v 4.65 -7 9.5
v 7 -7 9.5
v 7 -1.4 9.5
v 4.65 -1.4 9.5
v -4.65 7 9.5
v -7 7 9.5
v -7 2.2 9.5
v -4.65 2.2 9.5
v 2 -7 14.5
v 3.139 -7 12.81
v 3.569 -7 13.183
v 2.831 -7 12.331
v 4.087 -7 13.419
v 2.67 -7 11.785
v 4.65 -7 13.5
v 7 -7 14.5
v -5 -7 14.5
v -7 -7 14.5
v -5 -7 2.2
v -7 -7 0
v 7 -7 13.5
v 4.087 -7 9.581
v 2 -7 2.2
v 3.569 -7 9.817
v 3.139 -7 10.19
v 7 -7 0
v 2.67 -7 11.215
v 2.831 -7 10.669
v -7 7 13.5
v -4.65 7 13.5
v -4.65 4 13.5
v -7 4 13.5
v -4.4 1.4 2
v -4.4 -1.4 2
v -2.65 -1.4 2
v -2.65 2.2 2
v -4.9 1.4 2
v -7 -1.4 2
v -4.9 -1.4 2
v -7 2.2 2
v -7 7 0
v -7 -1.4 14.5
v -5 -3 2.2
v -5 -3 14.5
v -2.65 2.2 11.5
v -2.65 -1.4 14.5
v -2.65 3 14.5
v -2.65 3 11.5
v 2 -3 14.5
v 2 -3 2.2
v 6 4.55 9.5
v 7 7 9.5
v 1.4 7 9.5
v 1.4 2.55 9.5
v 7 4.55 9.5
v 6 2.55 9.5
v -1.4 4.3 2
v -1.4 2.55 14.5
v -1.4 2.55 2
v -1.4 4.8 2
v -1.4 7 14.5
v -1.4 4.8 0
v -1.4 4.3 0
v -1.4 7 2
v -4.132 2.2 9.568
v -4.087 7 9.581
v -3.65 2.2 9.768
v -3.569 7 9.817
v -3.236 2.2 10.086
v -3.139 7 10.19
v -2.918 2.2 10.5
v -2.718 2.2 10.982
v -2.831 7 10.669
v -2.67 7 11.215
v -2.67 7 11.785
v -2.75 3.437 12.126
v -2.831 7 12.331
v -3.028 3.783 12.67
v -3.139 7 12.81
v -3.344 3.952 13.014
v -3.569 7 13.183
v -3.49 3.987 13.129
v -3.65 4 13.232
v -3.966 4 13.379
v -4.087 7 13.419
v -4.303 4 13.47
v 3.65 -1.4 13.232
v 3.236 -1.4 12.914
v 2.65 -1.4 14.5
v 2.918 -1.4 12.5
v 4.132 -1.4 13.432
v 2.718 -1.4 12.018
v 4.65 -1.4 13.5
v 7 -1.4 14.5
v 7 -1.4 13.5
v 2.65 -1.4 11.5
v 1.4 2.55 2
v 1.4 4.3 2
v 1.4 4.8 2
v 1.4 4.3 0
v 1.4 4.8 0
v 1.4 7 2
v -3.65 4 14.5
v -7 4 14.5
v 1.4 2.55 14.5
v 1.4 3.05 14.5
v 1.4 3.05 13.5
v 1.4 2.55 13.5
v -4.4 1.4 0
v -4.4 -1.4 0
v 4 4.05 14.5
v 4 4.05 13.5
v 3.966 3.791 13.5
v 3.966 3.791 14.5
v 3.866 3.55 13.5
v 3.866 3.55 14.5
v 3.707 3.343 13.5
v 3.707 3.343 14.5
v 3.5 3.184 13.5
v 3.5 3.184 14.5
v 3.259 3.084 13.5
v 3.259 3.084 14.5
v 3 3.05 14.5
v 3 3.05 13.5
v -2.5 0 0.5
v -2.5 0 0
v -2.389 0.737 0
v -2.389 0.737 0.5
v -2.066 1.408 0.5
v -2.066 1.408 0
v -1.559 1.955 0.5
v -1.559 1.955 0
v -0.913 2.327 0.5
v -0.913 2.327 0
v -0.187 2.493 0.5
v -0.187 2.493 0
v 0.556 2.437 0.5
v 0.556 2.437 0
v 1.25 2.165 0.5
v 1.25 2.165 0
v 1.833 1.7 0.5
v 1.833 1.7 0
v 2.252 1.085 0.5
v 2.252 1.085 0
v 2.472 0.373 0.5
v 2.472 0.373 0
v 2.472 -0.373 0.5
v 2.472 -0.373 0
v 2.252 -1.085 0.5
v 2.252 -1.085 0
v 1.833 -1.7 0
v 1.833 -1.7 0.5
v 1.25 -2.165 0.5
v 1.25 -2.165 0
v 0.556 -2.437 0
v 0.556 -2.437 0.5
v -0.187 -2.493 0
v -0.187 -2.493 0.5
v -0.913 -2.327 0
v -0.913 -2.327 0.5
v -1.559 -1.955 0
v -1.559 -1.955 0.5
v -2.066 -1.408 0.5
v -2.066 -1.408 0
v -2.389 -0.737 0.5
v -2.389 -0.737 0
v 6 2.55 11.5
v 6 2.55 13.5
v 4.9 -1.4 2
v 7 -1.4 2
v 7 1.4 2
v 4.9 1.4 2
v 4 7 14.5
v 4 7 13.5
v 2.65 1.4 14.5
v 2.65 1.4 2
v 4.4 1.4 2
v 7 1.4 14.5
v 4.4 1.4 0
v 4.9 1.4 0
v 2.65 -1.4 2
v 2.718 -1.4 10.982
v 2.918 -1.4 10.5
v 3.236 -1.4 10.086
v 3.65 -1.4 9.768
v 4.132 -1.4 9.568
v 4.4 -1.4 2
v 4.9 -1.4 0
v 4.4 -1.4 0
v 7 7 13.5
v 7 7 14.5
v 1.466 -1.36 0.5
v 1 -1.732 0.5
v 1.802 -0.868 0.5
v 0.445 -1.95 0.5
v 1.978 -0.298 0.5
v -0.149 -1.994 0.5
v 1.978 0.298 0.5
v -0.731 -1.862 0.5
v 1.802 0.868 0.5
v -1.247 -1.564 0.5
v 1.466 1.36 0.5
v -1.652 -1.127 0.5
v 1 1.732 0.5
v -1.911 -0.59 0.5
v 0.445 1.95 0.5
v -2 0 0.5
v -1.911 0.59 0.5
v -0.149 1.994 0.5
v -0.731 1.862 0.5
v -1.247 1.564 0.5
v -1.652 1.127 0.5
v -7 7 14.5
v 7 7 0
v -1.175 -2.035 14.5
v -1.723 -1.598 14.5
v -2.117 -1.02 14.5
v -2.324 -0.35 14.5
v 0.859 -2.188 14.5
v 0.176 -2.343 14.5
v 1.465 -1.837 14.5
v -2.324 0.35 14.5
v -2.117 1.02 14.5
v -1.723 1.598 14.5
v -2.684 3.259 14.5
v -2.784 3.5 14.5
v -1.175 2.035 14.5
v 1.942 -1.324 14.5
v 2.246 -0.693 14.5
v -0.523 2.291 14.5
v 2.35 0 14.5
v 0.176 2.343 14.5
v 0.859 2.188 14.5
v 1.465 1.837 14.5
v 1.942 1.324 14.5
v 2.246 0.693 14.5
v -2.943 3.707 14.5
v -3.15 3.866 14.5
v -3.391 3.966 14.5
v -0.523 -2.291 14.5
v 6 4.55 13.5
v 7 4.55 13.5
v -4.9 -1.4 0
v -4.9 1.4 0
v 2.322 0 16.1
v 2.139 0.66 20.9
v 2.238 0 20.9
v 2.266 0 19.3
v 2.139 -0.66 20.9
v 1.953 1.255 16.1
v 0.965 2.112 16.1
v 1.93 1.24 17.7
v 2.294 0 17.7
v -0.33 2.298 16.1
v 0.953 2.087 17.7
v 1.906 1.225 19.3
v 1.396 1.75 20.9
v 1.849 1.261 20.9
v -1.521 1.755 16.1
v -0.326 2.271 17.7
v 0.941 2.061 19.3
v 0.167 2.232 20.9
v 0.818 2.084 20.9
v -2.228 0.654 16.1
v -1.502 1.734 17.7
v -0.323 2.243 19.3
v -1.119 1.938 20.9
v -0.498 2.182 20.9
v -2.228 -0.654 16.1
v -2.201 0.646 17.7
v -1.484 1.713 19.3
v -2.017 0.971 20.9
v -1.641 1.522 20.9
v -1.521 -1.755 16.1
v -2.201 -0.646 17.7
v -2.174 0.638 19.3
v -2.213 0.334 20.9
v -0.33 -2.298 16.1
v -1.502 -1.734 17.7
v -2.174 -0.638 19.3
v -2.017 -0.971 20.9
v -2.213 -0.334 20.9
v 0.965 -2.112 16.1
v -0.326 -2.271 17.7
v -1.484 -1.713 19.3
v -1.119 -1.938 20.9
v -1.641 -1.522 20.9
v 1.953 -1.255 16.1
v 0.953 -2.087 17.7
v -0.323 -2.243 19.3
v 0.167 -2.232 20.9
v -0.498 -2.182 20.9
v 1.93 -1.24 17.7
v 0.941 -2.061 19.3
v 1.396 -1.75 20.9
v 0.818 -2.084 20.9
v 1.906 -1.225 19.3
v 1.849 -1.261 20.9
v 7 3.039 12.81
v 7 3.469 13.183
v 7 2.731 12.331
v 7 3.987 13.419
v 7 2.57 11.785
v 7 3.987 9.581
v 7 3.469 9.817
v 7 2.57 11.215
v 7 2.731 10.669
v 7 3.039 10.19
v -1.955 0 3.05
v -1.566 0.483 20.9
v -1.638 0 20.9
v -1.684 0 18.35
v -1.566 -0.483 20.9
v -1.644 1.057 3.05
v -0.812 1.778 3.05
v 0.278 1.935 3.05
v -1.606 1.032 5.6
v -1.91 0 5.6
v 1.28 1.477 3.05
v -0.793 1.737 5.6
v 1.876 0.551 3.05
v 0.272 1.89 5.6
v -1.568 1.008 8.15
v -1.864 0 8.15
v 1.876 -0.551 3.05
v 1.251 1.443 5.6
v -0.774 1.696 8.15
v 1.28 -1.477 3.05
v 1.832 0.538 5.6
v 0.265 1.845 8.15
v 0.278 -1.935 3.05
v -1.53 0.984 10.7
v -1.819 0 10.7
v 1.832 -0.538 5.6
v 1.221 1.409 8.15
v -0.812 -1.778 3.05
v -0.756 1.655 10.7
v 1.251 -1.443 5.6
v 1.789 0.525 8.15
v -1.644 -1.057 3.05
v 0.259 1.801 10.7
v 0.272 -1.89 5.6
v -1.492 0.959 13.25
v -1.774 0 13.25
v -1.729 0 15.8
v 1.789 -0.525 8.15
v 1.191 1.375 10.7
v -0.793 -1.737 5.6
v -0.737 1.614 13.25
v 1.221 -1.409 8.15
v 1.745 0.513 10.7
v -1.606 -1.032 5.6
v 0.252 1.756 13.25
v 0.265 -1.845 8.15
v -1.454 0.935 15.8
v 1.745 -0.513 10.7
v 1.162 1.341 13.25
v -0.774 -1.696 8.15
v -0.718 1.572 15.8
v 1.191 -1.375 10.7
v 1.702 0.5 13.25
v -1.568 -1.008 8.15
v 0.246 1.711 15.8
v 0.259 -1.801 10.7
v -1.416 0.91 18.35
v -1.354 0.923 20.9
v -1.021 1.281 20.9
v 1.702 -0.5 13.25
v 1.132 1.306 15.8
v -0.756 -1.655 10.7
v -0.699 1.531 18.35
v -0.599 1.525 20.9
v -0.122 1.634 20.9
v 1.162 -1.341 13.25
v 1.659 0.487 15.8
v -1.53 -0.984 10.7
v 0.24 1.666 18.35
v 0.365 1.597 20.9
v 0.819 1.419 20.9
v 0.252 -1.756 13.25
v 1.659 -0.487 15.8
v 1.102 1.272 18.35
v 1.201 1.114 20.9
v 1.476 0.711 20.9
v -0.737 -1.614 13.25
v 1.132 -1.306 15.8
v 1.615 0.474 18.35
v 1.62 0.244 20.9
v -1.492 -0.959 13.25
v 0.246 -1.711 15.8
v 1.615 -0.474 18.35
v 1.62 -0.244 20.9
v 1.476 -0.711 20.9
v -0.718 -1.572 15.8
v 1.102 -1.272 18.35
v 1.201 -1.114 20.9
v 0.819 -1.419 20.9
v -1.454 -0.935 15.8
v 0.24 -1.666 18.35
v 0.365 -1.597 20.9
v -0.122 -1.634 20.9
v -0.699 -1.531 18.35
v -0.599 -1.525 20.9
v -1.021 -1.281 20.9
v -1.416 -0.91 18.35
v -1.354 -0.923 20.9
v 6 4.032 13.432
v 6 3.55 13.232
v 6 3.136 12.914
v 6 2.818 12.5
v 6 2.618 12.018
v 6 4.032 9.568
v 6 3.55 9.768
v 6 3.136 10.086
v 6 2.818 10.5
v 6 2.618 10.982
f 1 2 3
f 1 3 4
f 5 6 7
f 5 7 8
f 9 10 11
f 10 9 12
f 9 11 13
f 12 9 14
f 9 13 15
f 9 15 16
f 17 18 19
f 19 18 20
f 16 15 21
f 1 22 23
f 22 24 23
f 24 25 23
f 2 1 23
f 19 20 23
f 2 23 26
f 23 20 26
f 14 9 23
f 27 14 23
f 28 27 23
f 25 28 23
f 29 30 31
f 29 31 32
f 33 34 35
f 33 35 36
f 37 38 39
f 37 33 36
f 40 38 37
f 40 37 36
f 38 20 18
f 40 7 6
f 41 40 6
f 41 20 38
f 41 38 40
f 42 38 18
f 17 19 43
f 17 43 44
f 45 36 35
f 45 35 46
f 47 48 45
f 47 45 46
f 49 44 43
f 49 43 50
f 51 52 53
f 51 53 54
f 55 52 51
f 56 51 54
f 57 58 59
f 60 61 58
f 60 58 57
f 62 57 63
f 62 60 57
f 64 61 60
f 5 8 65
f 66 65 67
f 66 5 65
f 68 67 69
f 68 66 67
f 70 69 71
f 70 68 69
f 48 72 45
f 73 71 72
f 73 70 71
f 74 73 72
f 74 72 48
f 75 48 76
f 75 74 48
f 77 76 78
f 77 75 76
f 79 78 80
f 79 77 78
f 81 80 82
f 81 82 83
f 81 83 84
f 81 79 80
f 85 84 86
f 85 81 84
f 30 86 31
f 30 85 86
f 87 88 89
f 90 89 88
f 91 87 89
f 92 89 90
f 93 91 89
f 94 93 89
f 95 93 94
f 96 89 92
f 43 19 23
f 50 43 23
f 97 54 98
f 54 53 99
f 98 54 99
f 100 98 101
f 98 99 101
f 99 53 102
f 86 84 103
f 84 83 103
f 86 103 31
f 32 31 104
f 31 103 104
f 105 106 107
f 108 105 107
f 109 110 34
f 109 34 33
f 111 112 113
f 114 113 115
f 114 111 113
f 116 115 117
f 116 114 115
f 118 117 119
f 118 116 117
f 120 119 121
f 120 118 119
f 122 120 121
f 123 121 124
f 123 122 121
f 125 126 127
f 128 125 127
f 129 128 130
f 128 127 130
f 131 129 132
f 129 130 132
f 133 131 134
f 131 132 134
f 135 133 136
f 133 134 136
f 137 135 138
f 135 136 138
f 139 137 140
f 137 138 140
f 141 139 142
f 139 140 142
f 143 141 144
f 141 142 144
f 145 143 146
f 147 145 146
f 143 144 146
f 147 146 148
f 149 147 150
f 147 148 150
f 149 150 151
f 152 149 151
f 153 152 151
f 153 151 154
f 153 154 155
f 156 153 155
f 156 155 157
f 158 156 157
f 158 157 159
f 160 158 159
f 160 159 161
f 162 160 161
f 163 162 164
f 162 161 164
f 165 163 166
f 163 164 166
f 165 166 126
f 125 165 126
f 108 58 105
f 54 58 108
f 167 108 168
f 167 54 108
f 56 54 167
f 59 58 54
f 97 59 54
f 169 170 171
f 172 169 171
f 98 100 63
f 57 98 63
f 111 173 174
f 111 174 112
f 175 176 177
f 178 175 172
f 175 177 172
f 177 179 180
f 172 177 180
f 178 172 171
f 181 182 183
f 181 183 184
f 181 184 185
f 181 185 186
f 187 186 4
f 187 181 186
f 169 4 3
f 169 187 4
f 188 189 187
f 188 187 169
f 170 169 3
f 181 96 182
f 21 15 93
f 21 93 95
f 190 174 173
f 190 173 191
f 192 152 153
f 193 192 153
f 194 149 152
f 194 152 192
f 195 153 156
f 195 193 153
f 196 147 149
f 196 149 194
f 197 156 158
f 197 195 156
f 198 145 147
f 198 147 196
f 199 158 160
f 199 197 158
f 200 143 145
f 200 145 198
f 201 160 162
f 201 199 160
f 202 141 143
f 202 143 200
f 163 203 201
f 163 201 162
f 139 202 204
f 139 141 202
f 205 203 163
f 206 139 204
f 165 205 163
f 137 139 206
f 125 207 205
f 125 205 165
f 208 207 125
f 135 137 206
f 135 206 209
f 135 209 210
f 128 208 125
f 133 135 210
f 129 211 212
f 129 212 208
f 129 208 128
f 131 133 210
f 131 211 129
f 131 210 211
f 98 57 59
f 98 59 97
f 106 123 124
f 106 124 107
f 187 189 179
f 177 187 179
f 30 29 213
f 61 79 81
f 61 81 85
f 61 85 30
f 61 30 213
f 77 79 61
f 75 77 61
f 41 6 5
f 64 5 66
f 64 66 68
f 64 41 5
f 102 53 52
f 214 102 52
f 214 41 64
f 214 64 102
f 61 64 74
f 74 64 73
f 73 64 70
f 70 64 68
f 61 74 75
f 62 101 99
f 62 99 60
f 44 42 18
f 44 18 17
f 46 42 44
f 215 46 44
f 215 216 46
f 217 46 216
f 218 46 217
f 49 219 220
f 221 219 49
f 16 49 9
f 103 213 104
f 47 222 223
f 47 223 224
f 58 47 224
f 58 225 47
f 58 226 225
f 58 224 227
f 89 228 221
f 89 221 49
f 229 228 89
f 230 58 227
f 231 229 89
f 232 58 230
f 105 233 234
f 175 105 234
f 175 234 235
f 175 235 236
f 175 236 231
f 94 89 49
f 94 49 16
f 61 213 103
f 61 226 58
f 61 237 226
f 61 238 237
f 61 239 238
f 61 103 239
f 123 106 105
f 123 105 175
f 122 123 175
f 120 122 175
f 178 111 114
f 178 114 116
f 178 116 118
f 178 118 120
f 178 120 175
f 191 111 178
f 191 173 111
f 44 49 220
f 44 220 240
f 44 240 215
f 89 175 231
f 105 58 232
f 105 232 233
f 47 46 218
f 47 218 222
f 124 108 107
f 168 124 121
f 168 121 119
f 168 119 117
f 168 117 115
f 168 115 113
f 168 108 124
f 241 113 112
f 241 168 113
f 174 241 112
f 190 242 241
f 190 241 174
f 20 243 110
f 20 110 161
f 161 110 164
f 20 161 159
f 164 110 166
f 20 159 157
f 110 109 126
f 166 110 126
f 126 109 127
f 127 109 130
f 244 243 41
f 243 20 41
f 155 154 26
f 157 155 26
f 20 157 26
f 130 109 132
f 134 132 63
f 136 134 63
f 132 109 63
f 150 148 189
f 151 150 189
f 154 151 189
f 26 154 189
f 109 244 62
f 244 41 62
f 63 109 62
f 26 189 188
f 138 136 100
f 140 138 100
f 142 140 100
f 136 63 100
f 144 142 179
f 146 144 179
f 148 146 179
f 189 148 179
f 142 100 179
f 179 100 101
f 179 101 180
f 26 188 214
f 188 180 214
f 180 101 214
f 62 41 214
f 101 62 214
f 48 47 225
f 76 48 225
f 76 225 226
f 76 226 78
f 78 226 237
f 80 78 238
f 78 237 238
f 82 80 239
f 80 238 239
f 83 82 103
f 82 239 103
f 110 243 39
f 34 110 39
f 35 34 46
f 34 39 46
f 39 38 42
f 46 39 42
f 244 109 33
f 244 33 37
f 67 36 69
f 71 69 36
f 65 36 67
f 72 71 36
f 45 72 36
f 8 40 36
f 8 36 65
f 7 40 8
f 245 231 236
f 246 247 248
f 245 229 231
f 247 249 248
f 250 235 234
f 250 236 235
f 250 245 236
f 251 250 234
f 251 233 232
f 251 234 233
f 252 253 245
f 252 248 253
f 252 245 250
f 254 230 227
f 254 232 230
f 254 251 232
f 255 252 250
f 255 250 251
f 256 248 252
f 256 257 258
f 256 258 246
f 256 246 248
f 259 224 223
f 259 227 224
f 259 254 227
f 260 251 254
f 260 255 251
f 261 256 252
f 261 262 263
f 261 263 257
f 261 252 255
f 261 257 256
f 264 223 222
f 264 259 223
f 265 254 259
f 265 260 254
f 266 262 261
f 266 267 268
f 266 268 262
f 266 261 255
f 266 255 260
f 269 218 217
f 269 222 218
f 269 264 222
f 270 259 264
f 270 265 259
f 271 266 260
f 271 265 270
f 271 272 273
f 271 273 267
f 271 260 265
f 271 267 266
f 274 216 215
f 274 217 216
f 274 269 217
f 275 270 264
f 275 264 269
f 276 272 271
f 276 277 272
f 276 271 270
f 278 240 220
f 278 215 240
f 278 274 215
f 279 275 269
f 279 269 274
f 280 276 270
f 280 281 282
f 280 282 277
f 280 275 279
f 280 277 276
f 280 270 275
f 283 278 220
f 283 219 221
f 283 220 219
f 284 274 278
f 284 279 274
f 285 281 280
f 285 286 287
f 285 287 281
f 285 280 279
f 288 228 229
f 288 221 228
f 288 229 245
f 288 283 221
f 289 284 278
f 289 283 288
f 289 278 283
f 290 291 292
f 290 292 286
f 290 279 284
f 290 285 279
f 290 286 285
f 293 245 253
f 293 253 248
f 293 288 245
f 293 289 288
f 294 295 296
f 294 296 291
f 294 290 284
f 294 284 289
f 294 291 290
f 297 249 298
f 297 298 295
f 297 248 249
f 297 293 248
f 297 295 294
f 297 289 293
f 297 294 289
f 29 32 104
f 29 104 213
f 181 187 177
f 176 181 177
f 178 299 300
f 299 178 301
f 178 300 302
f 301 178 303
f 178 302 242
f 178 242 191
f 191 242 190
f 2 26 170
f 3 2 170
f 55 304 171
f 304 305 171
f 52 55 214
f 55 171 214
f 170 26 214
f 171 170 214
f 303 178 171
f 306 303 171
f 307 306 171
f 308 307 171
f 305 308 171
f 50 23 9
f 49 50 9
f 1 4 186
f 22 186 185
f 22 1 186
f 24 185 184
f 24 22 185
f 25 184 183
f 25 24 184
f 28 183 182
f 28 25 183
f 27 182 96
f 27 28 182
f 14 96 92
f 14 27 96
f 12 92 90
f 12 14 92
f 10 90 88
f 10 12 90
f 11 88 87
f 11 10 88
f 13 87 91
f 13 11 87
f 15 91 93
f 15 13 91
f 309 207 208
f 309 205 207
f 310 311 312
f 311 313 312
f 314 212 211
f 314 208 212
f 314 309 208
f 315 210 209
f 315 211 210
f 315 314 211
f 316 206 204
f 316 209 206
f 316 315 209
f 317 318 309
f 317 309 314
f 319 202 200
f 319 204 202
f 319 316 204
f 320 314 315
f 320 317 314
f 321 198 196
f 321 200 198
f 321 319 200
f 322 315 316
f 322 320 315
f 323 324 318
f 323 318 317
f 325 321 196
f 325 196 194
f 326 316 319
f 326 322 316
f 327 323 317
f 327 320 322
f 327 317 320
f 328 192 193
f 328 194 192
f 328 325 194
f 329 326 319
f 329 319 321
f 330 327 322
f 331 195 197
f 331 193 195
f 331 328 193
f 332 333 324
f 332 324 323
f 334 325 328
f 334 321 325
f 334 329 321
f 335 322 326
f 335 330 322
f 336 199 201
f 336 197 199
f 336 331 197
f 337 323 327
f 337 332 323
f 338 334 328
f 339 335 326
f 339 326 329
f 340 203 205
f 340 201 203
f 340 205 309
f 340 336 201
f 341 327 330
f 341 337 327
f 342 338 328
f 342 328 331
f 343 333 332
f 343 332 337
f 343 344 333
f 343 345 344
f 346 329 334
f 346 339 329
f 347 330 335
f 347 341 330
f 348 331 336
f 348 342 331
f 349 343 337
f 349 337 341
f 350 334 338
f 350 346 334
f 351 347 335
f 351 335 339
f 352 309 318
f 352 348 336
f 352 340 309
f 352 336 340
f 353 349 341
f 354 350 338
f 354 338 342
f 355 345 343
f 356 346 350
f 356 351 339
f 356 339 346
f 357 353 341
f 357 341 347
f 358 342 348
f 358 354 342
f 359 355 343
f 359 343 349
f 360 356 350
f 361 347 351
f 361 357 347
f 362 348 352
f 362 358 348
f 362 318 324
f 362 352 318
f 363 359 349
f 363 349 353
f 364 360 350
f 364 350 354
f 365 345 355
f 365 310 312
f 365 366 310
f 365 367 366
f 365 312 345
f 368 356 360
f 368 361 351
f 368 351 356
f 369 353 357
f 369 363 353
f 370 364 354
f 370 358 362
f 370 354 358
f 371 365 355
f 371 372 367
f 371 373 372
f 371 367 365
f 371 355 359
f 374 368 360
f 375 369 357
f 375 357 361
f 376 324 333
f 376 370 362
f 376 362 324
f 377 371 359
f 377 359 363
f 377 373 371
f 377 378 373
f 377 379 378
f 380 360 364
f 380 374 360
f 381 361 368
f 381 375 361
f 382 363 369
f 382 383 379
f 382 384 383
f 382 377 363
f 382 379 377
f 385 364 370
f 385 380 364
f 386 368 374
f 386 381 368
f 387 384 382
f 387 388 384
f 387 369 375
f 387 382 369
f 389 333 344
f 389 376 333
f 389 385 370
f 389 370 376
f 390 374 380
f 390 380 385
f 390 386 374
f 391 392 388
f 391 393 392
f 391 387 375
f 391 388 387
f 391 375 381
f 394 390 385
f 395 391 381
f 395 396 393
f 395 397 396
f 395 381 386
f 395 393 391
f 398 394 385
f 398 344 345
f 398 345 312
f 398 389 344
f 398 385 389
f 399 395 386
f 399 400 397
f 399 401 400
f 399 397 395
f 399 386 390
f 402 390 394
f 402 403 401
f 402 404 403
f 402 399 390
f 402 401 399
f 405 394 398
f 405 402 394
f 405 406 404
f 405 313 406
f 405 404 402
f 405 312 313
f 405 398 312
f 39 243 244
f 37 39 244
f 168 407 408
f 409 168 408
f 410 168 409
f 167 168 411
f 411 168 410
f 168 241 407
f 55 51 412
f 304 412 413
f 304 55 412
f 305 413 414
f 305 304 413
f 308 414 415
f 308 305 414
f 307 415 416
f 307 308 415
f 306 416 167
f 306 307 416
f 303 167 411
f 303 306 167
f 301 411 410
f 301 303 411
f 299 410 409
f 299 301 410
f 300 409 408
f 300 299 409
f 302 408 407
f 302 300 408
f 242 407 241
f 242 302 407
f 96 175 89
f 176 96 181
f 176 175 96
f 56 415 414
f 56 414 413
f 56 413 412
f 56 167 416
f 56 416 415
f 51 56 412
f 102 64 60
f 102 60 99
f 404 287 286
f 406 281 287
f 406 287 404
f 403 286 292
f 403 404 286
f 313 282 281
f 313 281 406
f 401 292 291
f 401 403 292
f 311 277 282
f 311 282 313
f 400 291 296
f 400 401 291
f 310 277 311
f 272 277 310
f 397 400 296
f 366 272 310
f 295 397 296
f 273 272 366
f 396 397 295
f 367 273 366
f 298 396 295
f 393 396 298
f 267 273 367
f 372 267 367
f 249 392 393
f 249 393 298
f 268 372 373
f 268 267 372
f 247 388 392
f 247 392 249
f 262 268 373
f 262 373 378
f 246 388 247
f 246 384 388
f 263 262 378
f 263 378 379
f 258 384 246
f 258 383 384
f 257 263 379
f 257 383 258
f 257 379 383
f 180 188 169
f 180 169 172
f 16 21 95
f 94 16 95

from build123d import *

# Parameters (mm, degrees)
BASES_W                            = 14
BASES_H                            = 14
BASE_DEPTH                         = 14.5
NEUTRALS_W                         = 0.5
NEUTRALS_H                         = 2.8
NEUTRAL_DEPTH                      = 18.557049866
GROUNDS_W                          = 2.8
GROUNDS_H                          = 0.5
GROUND_DEPTH                       = 18.557049866
TOP_GROUND_AREA_REACH              = 23.337
SKETCH1_W                          = 2.8
SKETCH1_H                          = 11.5
SKETCH15_W                         = 2.8
SKETCH15_H                         = 12.5
GND_POCKET_EXTRA_CUT_DEPTH         = 1.75
SIDE_GROUND_AREA_DEPTH             = 5
SIDE_GND_TERMINAL_SCREW_AREA_REACH = 23.337
POCKET_START                       = -1.75
SKETCH4_W                          = 7.4
SKETCH4_H                          = 4
POCKET_GND_TERMINAL_AREA_DEPTH     = 2
SKETCH6_W                          = 12.5
SKETCH6_H                          = 3.6
NEUTRAL_SIDE_AREA_CUT_DEPTH        = 4.35
NEUTRAL_SIDE_SCREW_TERMINAL_DEPTH  = 8.4
NEUTRAL_SIDE_CURVED_WALL_CUT_REACH = 19.557
SKETCH8_W                          = 12.5
SKETCH8_H                          = 2.8
LINE_AREA_CUT_DEPTH                = 4.35
LINE_SIDE_SCREW_TERMINAL_REACH     = 23.337
SKETCH10_W                         = 7
SKETCH10_H                         = 12.3
BOTTOM_POCKET_DEPTH                = 4
SKETCH11_R                         = 2.5
FASTENER_TOP_BORE_DEPTH            = 0.5
SKETCH13_R                         = 2.35
FASTENER_BOSS_DEPTH                = 6.4
FASTENER_BOSS_TAPER                = 1
SKETCH12_R                         = 2
SKETCH14_R                         = 1.638287584


with BuildPart() as part:
    # BaseS → BASE (new body)
    with BuildSketch(Plane.XY):
        Rectangle(BASES_W, BASES_H)
    extrude(amount=BASE_DEPTH)

    # NeutralS → NEUTRAL (cut, through all)
    with BuildSketch(Plane(origin=(0, 0, 0), x_dir=(-1, 0, 0), z_dir=(0, 0, -1))):
        with Locations((4.65, 0)):
            Rectangle(NEUTRALS_W, NEUTRALS_H)
    neutral = extrude(amount=-NEUTRAL_DEPTH, mode=Mode.SUBTRACT)

    # LINE HM: NEUTRAL across plane
    add(neutral.mirror(Plane(origin=(0, 0, 0), x_dir=(0, 0, 1), z_dir=(1, 0, 0))), mode=Mode.SUBTRACT)

    # GroundS → GROUND (cut, through all)
    with BuildSketch(Plane(origin=(0, 0, 0), x_dir=(-1, 0, 0), z_dir=(0, 0, -1))):
        with Locations((0, 4.55)):
            Rectangle(GROUNDS_W, GROUNDS_H)
    extrude(amount=-GROUND_DEPTH, mode=Mode.SUBTRACT)

    # Sketch1 → TOP GROUND AREA (cut, up to next)
    with BuildSketch(Plane(origin=(0, 7, 0), x_dir=(1, 0, 0), z_dir=(0, 1, 0)), mode=Mode.PRIVATE) as top_ground_area_sk1:
        with Locations((0, -7.75)):
            Rectangle(SKETCH1_W, SKETCH1_H)
    top_ground_area_tool1 = extrude(top_ground_area_sk1.sketch, amount=-TOP_GROUND_AREA_REACH, mode=Mode.PRIVATE) & part.part
    add(top_ground_area_tool1.solids().sort_by_distance((0, 7, 7.75))[0], mode=Mode.SUBTRACT)

    # Sketch15 → GND POCKET EXTRA CUT (cut)
    with BuildSketch(Plane(origin=(0, 4.3, 0), x_dir=(1, 0, 0), z_dir=(0, 1, 0))):
        with Locations((0, -8.25)):
            Rectangle(SKETCH15_W, SKETCH15_H)
    extrude(amount=-GND_POCKET_EXTRA_CUT_DEPTH, mode=Mode.SUBTRACT)

    # Sketch2 → SIDE GROUND AREA (cut)
    with BuildSketch(Plane.XY.offset(14.5)):
        with BuildLine():
            Line((4, 7), (4, 4.05))
            ThreePointArc((4, 4.05), (3.707106781, 3.342893219), (3, 3.05))
            Line((3, 3.05), (0.6, 3.05))
            Line((0.6, 3.05), (0.6, 2.55))
            Line((0.6, 2.55), (-1.4, 2.55))
            Line((-1.4, 2.55), (-1.4, 7))
            Line((-1.4, 7), (4, 7))
        make_face()
    extrude(amount=-SIDE_GROUND_AREA_DEPTH, mode=Mode.SUBTRACT)

    # SIDE GND TERMINAL SCREW AREA: up to this face of the body (flat: up to its plane)
    side_gnd_terminal_screw_area_end = Plane(part.part.faces().sort_by_distance((1.4, 4.635, 6.044915254))[0])
    # Sketch3 → SIDE GND TERMINAL SCREW AREA (cut, up to the picked face)
    with BuildSketch(Plane(origin=(7, 0, 0), x_dir=(0, 0, -1), z_dir=(1, 0, 0)), mode=Mode.PRIVATE) as side_gnd_terminal_screw_area_sk1:
        with BuildLine():
            Line((-9.5, 9.45), (-9.5, 4.55))
            ThreePointArc((-9.5, 4.55), (-11.5, 2.55), (-13.5, 4.55))
            Line((-13.5, 4.55), (-13.5, 9.45))
            ThreePointArc((-13.5, 9.45), (-11.5, 11.45), (-9.5, 9.45))
        make_face()
    side_gnd_terminal_screw_area_tool1 = split(extrude(side_gnd_terminal_screw_area_sk1.sketch, amount=-SIDE_GND_TERMINAL_SCREW_AREA_REACH, mode=Mode.PRIVATE), bisect_by=side_gnd_terminal_screw_area_end, keep=Keep.BOTH, mode=Mode.PRIVATE)
    add(side_gnd_terminal_screw_area_tool1.solids().sort_by(Axis((7, 7, 11.5), (-1, 0, 0)))[0], mode=Mode.SUBTRACT)

    # Sketch4 → POCKET GND TERMINAL AREA (cut)
    with BuildSketch(Plane(origin=(0, 4.3, 0), x_dir=(1, 0, 0), z_dir=(0, 1, 0)).offset(POCKET_START)):
        with Locations((2.3, -11.5)):
            Rectangle(SKETCH4_W, SKETCH4_H)
    extrude(amount=POCKET_GND_TERMINAL_AREA_DEPTH, mode=Mode.SUBTRACT)

    # Sketch6 → NEUTRAL SIDE AREA CUT (cut)
    with BuildSketch(Plane.ZY.offset(7)):
        with Locations((8.25, 0.4)):
            Rectangle(SKETCH6_W, SKETCH6_H)
    extrude(amount=-NEUTRAL_SIDE_AREA_CUT_DEPTH, mode=Mode.SUBTRACT)

    # Sketch5 → NEUTRAL SIDE SCREW TERMINAL (cut)
    with BuildSketch(Plane(origin=(0, 7, 0), x_dir=(1, 0, 0), z_dir=(0, 1, 0))):
        with BuildLine():
            Line((-9.35, -9.5), (-4.65, -9.5))
            ThreePointArc((-4.65, -9.5), (-2.65, -11.5), (-4.65, -13.5))
            Line((-4.65, -13.5), (-9.35, -13.5))
            ThreePointArc((-9.35, -13.5), (-11.35, -11.5), (-9.35, -9.5))
        make_face()
    extrude(amount=-NEUTRAL_SIDE_SCREW_TERMINAL_DEPTH, mode=Mode.SUBTRACT)

    # Sketch7 → NEUTRAL SIDE CURVED WALL CUT (cut, up to next)
    with BuildSketch(Plane.XY.offset(14.5), mode=Mode.PRIVATE) as neutral_side_curved_wall_cut_sk1:
        with BuildLine():
            Line((-7, 2.2), (-2.65, 2.2))
            Line((-2.65, 2.2), (-2.65, 3))
            ThreePointArc((-2.65, 3), (-2.942893219, 3.707106781), (-3.65, 4))
            Line((-3.65, 4), (-7, 4))
            Line((-7, 4), (-7, 2.2))
        make_face()
    neutral_side_curved_wall_cut_tool1 = extrude(neutral_side_curved_wall_cut_sk1.sketch, amount=-NEUTRAL_SIDE_CURVED_WALL_CUT_REACH, mode=Mode.PRIVATE) & part.part
    add(neutral_side_curved_wall_cut_tool1.solids().sort_by_distance((-4.879997, 3.080933, 14.5))[0], mode=Mode.SUBTRACT)

    # Sketch8 → LINE AREA CUT (cut)
    with BuildSketch(Plane(origin=(7, 0, 0), x_dir=(0, 0, -1), z_dir=(1, 0, 0))):
        with Locations((-8.25, 0)):
            Rectangle(SKETCH8_W, SKETCH8_H)
    extrude(amount=-LINE_AREA_CUT_DEPTH, mode=Mode.SUBTRACT)

    # Sketch9 → LINE SIDE SCREW TERMINAL (cut, up to next)
    with BuildSketch(Plane(origin=(0, -7, 0), x_dir=(-1, 0, 0), z_dir=(0, -1, 0)), mode=Mode.PRIVATE) as line_side_screw_terminal_sk1:
        with BuildLine():
            Line((-4.65, -13.5), (-7, -13.5))
            ThreePointArc((-7, -13.5), (-9, -11.5), (-7, -9.5))
            Line((-7, -9.5), (-4.65, -9.5))
            ThreePointArc((-4.65, -9.5), (-2.65, -11.5), (-4.65, -13.5))
        make_face()
    line_side_screw_terminal_tool1 = extrude(line_side_screw_terminal_sk1.sketch, amount=-LINE_SIDE_SCREW_TERMINAL_REACH, mode=Mode.PRIVATE) & part.part
    add(line_side_screw_terminal_tool1.solids().sort_by_distance((5.825, -7, 11.5))[0], mode=Mode.SUBTRACT)

    # Sketch10 → BOTTOM POCKET (cut)
    with BuildSketch(Plane.XZ.offset(7)):
        with Locations((-1.5, 8.35)):
            Rectangle(SKETCH10_W, SKETCH10_H)
    extrude(amount=-BOTTOM_POCKET_DEPTH, mode=Mode.SUBTRACT)

    # Sketch11 → FASTENER TOP BORE (cut)
    with BuildSketch(Plane(origin=(0, 0, 0), x_dir=(-1, 0, 0), z_dir=(0, 0, -1))):
        Circle(SKETCH11_R)
    extrude(amount=-FASTENER_TOP_BORE_DEPTH, mode=Mode.SUBTRACT)

    # Sketch13 → FASTENER BOSS (add)
    with BuildSketch(Plane.XY.offset(14.5)):
        Circle(SKETCH13_R)
    extrude(amount=FASTENER_BOSS_DEPTH, taper=FASTENER_BOSS_TAPER)

    # Sketch12 → FASTENER CLEARANCE HOLE section 0
    with BuildSketch(Plane(origin=(0, 0, 0.5), x_dir=(-1, 0, 0), z_dir=(0, 0, -1))):
        Circle(SKETCH12_R)
    # Sketch14 → FASTENER CLEARANCE HOLE section 1
    with BuildSketch(Plane.XY.offset(20.9)):
        Circle(SKETCH14_R)
    loft(mode=Mode.SUBTRACT)


solid = part.part
